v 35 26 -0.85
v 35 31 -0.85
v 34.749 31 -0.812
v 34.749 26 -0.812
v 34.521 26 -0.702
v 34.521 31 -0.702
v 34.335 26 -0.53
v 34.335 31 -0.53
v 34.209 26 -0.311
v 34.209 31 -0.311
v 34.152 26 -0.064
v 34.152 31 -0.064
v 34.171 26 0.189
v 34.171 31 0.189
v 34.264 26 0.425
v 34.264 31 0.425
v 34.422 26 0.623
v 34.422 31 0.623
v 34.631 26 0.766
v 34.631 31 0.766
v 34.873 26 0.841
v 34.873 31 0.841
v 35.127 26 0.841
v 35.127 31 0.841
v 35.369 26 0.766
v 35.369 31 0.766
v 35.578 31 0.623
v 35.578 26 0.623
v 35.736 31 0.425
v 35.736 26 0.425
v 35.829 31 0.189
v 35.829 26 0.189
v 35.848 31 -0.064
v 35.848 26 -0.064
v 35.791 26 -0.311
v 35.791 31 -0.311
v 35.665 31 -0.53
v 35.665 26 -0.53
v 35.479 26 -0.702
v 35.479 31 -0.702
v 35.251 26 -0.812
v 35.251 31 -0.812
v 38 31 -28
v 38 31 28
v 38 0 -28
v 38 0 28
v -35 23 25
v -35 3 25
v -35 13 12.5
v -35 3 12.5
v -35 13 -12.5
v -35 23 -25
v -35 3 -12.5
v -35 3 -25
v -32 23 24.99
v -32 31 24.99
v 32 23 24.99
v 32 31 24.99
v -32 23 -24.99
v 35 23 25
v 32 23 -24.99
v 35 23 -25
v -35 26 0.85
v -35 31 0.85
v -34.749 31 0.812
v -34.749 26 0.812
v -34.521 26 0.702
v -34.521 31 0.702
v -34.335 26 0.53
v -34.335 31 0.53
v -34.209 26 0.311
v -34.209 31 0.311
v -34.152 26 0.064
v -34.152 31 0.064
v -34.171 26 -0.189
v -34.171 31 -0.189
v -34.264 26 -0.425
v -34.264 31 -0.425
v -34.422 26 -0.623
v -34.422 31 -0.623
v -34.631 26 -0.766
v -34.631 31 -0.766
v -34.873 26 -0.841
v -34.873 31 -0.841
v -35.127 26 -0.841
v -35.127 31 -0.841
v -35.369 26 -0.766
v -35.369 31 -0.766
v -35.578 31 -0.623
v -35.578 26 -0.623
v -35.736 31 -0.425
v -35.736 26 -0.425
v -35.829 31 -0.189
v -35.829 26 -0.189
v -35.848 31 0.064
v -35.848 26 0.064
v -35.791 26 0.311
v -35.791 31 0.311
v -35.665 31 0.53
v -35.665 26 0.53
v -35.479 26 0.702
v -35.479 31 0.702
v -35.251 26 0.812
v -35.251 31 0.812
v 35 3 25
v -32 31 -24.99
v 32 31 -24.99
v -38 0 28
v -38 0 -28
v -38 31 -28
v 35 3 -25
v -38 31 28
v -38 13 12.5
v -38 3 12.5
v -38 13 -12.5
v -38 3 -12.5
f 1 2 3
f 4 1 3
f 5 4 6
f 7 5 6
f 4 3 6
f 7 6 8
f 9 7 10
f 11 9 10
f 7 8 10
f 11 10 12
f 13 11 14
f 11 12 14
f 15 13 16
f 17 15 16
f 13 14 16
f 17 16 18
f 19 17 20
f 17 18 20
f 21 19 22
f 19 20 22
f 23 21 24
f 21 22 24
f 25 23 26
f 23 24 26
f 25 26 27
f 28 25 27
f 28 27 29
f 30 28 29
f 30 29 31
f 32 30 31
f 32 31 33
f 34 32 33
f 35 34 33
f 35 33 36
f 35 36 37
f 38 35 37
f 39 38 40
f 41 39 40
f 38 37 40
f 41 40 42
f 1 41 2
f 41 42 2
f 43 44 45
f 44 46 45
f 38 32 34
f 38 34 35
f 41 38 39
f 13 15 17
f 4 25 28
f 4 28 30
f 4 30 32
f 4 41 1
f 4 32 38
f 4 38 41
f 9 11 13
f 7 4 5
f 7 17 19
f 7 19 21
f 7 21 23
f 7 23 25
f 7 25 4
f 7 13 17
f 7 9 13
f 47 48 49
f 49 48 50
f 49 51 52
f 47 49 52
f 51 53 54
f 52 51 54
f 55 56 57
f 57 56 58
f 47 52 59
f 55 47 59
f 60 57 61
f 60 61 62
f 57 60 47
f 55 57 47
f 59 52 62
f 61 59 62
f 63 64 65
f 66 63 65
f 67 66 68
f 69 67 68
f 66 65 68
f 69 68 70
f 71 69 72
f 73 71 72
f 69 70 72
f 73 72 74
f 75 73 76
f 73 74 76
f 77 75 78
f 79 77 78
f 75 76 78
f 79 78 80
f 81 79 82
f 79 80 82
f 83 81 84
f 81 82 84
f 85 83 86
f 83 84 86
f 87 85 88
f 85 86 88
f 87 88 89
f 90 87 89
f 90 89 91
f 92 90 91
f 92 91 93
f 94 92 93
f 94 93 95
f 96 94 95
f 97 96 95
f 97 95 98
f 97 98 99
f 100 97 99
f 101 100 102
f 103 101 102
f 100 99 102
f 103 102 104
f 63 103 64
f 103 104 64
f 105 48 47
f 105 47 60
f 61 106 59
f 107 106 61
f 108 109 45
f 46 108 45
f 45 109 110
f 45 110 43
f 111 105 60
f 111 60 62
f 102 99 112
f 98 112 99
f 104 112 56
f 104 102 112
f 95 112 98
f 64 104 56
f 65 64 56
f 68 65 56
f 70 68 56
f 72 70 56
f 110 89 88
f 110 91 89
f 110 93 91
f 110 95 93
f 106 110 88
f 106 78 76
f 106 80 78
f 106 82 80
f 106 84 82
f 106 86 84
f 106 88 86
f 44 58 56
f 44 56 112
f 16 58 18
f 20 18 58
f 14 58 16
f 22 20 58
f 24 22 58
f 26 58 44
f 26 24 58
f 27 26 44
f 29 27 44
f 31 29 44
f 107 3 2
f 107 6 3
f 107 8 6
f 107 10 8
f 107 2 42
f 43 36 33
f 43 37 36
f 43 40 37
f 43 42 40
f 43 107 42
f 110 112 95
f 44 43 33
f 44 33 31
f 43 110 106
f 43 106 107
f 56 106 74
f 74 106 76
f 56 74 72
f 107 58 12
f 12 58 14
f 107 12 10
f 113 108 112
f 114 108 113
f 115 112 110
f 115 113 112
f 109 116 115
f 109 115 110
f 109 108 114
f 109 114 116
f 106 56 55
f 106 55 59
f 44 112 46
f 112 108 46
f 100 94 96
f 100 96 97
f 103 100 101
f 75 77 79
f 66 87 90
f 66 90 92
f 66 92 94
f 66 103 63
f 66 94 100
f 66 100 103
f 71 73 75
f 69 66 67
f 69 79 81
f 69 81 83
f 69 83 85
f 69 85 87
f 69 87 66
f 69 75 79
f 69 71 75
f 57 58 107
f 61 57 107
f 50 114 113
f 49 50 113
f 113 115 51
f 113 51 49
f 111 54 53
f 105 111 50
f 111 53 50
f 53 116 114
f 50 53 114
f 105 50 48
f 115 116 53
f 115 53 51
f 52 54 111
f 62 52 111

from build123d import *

# Parameters (mm, degrees)
SKETCH1_W           = 76
SKETCH1_H           = 56
BOSS_EXTRUDE1_DEPTH = 3
SKETCH2_W           = 76
SKETCH2_H           = 56
SKETCH2_W_2         = 70
SKETCH2_H_2         = 50
BOSS_EXTRUDE2_DEPTH = 28
CUT_EXTRUDE1_REACH  = 88.724
SKETCH3_W           = 25
SKETCH3_H           = 10
BOSS_EXTRUDE3_START = 31
SKETCH4_W           = 70
SKETCH4_H           = 50
SKETCH4_W_2         = 64
SKETCH4_H_2         = 49.98
BOSS_EXTRUDE3_DEPTH = 8
SKETCH5_R           = 0.85
CUT_EXTRUDE2_DEPTH  = 5


with BuildPart() as part:
    # Sketch1 → Boss-Extrude1 (new body)
    with BuildSketch(Plane(origin=(0, 0, 0), x_dir=(1, 0, 0), z_dir=(0, 1, 0))):
        Rectangle(SKETCH1_W, SKETCH1_H)
    extrude(amount=BOSS_EXTRUDE1_DEPTH)

    # Sketch2 → Boss-Extrude2 (add)
    with BuildSketch(Plane(origin=(0, 3, 0), x_dir=(1, 0, 0), z_dir=(0, 1, 0))):
        Rectangle(SKETCH2_W, SKETCH2_H)
        Rectangle(SKETCH2_W_2, SKETCH2_H_2, mode=Mode.SUBTRACT)
    extrude(amount=BOSS_EXTRUDE2_DEPTH)

    # Sketch3 → Cut-Extrude1 (cut, up to next)
    with BuildSketch(Plane.ZY.offset(38), mode=Mode.PRIVATE) as cut_extrude1_sk1:
        with Locations((0, 8)):
            Rectangle(SKETCH3_W, SKETCH3_H)
    cut_extrude1_tool1 = extrude(cut_extrude1_sk1.sketch, amount=-CUT_EXTRUDE1_REACH, mode=Mode.PRIVATE) & part.part
    add(cut_extrude1_tool1.solids().sort_by_distance((-38, 8, 0))[0], mode=Mode.SUBTRACT)

    # Sketch4 → Boss-Extrude3 (add)
    with BuildSketch(Plane(origin=(0, 0, 0), x_dir=(1, 0, 0), z_dir=(0, 1, 0)).offset(BOSS_EXTRUDE3_START)):
        Rectangle(SKETCH4_W, SKETCH4_H)
        Rectangle(SKETCH4_W_2, SKETCH4_H_2, mode=Mode.SUBTRACT)
    extrude(amount=-BOSS_EXTRUDE3_DEPTH)

    # Sketch5 → Cut-Extrude2 (cut)
    with BuildSketch(Plane(origin=(0, 31, 0), x_dir=(1, 0, 0), z_dir=(0, 1, 0))):
        with Locations(Location((-35, 0, 0), (0, 0, 270))):
            Circle(SKETCH5_R)
        with Locations(Location((35, 0, 0), (0, 0, 90))):
            Circle(SKETCH5_R)
    extrude(amount=-CUT_EXTRUDE2_DEPTH, mode=Mode.SUBTRACT)


solid = part.part
